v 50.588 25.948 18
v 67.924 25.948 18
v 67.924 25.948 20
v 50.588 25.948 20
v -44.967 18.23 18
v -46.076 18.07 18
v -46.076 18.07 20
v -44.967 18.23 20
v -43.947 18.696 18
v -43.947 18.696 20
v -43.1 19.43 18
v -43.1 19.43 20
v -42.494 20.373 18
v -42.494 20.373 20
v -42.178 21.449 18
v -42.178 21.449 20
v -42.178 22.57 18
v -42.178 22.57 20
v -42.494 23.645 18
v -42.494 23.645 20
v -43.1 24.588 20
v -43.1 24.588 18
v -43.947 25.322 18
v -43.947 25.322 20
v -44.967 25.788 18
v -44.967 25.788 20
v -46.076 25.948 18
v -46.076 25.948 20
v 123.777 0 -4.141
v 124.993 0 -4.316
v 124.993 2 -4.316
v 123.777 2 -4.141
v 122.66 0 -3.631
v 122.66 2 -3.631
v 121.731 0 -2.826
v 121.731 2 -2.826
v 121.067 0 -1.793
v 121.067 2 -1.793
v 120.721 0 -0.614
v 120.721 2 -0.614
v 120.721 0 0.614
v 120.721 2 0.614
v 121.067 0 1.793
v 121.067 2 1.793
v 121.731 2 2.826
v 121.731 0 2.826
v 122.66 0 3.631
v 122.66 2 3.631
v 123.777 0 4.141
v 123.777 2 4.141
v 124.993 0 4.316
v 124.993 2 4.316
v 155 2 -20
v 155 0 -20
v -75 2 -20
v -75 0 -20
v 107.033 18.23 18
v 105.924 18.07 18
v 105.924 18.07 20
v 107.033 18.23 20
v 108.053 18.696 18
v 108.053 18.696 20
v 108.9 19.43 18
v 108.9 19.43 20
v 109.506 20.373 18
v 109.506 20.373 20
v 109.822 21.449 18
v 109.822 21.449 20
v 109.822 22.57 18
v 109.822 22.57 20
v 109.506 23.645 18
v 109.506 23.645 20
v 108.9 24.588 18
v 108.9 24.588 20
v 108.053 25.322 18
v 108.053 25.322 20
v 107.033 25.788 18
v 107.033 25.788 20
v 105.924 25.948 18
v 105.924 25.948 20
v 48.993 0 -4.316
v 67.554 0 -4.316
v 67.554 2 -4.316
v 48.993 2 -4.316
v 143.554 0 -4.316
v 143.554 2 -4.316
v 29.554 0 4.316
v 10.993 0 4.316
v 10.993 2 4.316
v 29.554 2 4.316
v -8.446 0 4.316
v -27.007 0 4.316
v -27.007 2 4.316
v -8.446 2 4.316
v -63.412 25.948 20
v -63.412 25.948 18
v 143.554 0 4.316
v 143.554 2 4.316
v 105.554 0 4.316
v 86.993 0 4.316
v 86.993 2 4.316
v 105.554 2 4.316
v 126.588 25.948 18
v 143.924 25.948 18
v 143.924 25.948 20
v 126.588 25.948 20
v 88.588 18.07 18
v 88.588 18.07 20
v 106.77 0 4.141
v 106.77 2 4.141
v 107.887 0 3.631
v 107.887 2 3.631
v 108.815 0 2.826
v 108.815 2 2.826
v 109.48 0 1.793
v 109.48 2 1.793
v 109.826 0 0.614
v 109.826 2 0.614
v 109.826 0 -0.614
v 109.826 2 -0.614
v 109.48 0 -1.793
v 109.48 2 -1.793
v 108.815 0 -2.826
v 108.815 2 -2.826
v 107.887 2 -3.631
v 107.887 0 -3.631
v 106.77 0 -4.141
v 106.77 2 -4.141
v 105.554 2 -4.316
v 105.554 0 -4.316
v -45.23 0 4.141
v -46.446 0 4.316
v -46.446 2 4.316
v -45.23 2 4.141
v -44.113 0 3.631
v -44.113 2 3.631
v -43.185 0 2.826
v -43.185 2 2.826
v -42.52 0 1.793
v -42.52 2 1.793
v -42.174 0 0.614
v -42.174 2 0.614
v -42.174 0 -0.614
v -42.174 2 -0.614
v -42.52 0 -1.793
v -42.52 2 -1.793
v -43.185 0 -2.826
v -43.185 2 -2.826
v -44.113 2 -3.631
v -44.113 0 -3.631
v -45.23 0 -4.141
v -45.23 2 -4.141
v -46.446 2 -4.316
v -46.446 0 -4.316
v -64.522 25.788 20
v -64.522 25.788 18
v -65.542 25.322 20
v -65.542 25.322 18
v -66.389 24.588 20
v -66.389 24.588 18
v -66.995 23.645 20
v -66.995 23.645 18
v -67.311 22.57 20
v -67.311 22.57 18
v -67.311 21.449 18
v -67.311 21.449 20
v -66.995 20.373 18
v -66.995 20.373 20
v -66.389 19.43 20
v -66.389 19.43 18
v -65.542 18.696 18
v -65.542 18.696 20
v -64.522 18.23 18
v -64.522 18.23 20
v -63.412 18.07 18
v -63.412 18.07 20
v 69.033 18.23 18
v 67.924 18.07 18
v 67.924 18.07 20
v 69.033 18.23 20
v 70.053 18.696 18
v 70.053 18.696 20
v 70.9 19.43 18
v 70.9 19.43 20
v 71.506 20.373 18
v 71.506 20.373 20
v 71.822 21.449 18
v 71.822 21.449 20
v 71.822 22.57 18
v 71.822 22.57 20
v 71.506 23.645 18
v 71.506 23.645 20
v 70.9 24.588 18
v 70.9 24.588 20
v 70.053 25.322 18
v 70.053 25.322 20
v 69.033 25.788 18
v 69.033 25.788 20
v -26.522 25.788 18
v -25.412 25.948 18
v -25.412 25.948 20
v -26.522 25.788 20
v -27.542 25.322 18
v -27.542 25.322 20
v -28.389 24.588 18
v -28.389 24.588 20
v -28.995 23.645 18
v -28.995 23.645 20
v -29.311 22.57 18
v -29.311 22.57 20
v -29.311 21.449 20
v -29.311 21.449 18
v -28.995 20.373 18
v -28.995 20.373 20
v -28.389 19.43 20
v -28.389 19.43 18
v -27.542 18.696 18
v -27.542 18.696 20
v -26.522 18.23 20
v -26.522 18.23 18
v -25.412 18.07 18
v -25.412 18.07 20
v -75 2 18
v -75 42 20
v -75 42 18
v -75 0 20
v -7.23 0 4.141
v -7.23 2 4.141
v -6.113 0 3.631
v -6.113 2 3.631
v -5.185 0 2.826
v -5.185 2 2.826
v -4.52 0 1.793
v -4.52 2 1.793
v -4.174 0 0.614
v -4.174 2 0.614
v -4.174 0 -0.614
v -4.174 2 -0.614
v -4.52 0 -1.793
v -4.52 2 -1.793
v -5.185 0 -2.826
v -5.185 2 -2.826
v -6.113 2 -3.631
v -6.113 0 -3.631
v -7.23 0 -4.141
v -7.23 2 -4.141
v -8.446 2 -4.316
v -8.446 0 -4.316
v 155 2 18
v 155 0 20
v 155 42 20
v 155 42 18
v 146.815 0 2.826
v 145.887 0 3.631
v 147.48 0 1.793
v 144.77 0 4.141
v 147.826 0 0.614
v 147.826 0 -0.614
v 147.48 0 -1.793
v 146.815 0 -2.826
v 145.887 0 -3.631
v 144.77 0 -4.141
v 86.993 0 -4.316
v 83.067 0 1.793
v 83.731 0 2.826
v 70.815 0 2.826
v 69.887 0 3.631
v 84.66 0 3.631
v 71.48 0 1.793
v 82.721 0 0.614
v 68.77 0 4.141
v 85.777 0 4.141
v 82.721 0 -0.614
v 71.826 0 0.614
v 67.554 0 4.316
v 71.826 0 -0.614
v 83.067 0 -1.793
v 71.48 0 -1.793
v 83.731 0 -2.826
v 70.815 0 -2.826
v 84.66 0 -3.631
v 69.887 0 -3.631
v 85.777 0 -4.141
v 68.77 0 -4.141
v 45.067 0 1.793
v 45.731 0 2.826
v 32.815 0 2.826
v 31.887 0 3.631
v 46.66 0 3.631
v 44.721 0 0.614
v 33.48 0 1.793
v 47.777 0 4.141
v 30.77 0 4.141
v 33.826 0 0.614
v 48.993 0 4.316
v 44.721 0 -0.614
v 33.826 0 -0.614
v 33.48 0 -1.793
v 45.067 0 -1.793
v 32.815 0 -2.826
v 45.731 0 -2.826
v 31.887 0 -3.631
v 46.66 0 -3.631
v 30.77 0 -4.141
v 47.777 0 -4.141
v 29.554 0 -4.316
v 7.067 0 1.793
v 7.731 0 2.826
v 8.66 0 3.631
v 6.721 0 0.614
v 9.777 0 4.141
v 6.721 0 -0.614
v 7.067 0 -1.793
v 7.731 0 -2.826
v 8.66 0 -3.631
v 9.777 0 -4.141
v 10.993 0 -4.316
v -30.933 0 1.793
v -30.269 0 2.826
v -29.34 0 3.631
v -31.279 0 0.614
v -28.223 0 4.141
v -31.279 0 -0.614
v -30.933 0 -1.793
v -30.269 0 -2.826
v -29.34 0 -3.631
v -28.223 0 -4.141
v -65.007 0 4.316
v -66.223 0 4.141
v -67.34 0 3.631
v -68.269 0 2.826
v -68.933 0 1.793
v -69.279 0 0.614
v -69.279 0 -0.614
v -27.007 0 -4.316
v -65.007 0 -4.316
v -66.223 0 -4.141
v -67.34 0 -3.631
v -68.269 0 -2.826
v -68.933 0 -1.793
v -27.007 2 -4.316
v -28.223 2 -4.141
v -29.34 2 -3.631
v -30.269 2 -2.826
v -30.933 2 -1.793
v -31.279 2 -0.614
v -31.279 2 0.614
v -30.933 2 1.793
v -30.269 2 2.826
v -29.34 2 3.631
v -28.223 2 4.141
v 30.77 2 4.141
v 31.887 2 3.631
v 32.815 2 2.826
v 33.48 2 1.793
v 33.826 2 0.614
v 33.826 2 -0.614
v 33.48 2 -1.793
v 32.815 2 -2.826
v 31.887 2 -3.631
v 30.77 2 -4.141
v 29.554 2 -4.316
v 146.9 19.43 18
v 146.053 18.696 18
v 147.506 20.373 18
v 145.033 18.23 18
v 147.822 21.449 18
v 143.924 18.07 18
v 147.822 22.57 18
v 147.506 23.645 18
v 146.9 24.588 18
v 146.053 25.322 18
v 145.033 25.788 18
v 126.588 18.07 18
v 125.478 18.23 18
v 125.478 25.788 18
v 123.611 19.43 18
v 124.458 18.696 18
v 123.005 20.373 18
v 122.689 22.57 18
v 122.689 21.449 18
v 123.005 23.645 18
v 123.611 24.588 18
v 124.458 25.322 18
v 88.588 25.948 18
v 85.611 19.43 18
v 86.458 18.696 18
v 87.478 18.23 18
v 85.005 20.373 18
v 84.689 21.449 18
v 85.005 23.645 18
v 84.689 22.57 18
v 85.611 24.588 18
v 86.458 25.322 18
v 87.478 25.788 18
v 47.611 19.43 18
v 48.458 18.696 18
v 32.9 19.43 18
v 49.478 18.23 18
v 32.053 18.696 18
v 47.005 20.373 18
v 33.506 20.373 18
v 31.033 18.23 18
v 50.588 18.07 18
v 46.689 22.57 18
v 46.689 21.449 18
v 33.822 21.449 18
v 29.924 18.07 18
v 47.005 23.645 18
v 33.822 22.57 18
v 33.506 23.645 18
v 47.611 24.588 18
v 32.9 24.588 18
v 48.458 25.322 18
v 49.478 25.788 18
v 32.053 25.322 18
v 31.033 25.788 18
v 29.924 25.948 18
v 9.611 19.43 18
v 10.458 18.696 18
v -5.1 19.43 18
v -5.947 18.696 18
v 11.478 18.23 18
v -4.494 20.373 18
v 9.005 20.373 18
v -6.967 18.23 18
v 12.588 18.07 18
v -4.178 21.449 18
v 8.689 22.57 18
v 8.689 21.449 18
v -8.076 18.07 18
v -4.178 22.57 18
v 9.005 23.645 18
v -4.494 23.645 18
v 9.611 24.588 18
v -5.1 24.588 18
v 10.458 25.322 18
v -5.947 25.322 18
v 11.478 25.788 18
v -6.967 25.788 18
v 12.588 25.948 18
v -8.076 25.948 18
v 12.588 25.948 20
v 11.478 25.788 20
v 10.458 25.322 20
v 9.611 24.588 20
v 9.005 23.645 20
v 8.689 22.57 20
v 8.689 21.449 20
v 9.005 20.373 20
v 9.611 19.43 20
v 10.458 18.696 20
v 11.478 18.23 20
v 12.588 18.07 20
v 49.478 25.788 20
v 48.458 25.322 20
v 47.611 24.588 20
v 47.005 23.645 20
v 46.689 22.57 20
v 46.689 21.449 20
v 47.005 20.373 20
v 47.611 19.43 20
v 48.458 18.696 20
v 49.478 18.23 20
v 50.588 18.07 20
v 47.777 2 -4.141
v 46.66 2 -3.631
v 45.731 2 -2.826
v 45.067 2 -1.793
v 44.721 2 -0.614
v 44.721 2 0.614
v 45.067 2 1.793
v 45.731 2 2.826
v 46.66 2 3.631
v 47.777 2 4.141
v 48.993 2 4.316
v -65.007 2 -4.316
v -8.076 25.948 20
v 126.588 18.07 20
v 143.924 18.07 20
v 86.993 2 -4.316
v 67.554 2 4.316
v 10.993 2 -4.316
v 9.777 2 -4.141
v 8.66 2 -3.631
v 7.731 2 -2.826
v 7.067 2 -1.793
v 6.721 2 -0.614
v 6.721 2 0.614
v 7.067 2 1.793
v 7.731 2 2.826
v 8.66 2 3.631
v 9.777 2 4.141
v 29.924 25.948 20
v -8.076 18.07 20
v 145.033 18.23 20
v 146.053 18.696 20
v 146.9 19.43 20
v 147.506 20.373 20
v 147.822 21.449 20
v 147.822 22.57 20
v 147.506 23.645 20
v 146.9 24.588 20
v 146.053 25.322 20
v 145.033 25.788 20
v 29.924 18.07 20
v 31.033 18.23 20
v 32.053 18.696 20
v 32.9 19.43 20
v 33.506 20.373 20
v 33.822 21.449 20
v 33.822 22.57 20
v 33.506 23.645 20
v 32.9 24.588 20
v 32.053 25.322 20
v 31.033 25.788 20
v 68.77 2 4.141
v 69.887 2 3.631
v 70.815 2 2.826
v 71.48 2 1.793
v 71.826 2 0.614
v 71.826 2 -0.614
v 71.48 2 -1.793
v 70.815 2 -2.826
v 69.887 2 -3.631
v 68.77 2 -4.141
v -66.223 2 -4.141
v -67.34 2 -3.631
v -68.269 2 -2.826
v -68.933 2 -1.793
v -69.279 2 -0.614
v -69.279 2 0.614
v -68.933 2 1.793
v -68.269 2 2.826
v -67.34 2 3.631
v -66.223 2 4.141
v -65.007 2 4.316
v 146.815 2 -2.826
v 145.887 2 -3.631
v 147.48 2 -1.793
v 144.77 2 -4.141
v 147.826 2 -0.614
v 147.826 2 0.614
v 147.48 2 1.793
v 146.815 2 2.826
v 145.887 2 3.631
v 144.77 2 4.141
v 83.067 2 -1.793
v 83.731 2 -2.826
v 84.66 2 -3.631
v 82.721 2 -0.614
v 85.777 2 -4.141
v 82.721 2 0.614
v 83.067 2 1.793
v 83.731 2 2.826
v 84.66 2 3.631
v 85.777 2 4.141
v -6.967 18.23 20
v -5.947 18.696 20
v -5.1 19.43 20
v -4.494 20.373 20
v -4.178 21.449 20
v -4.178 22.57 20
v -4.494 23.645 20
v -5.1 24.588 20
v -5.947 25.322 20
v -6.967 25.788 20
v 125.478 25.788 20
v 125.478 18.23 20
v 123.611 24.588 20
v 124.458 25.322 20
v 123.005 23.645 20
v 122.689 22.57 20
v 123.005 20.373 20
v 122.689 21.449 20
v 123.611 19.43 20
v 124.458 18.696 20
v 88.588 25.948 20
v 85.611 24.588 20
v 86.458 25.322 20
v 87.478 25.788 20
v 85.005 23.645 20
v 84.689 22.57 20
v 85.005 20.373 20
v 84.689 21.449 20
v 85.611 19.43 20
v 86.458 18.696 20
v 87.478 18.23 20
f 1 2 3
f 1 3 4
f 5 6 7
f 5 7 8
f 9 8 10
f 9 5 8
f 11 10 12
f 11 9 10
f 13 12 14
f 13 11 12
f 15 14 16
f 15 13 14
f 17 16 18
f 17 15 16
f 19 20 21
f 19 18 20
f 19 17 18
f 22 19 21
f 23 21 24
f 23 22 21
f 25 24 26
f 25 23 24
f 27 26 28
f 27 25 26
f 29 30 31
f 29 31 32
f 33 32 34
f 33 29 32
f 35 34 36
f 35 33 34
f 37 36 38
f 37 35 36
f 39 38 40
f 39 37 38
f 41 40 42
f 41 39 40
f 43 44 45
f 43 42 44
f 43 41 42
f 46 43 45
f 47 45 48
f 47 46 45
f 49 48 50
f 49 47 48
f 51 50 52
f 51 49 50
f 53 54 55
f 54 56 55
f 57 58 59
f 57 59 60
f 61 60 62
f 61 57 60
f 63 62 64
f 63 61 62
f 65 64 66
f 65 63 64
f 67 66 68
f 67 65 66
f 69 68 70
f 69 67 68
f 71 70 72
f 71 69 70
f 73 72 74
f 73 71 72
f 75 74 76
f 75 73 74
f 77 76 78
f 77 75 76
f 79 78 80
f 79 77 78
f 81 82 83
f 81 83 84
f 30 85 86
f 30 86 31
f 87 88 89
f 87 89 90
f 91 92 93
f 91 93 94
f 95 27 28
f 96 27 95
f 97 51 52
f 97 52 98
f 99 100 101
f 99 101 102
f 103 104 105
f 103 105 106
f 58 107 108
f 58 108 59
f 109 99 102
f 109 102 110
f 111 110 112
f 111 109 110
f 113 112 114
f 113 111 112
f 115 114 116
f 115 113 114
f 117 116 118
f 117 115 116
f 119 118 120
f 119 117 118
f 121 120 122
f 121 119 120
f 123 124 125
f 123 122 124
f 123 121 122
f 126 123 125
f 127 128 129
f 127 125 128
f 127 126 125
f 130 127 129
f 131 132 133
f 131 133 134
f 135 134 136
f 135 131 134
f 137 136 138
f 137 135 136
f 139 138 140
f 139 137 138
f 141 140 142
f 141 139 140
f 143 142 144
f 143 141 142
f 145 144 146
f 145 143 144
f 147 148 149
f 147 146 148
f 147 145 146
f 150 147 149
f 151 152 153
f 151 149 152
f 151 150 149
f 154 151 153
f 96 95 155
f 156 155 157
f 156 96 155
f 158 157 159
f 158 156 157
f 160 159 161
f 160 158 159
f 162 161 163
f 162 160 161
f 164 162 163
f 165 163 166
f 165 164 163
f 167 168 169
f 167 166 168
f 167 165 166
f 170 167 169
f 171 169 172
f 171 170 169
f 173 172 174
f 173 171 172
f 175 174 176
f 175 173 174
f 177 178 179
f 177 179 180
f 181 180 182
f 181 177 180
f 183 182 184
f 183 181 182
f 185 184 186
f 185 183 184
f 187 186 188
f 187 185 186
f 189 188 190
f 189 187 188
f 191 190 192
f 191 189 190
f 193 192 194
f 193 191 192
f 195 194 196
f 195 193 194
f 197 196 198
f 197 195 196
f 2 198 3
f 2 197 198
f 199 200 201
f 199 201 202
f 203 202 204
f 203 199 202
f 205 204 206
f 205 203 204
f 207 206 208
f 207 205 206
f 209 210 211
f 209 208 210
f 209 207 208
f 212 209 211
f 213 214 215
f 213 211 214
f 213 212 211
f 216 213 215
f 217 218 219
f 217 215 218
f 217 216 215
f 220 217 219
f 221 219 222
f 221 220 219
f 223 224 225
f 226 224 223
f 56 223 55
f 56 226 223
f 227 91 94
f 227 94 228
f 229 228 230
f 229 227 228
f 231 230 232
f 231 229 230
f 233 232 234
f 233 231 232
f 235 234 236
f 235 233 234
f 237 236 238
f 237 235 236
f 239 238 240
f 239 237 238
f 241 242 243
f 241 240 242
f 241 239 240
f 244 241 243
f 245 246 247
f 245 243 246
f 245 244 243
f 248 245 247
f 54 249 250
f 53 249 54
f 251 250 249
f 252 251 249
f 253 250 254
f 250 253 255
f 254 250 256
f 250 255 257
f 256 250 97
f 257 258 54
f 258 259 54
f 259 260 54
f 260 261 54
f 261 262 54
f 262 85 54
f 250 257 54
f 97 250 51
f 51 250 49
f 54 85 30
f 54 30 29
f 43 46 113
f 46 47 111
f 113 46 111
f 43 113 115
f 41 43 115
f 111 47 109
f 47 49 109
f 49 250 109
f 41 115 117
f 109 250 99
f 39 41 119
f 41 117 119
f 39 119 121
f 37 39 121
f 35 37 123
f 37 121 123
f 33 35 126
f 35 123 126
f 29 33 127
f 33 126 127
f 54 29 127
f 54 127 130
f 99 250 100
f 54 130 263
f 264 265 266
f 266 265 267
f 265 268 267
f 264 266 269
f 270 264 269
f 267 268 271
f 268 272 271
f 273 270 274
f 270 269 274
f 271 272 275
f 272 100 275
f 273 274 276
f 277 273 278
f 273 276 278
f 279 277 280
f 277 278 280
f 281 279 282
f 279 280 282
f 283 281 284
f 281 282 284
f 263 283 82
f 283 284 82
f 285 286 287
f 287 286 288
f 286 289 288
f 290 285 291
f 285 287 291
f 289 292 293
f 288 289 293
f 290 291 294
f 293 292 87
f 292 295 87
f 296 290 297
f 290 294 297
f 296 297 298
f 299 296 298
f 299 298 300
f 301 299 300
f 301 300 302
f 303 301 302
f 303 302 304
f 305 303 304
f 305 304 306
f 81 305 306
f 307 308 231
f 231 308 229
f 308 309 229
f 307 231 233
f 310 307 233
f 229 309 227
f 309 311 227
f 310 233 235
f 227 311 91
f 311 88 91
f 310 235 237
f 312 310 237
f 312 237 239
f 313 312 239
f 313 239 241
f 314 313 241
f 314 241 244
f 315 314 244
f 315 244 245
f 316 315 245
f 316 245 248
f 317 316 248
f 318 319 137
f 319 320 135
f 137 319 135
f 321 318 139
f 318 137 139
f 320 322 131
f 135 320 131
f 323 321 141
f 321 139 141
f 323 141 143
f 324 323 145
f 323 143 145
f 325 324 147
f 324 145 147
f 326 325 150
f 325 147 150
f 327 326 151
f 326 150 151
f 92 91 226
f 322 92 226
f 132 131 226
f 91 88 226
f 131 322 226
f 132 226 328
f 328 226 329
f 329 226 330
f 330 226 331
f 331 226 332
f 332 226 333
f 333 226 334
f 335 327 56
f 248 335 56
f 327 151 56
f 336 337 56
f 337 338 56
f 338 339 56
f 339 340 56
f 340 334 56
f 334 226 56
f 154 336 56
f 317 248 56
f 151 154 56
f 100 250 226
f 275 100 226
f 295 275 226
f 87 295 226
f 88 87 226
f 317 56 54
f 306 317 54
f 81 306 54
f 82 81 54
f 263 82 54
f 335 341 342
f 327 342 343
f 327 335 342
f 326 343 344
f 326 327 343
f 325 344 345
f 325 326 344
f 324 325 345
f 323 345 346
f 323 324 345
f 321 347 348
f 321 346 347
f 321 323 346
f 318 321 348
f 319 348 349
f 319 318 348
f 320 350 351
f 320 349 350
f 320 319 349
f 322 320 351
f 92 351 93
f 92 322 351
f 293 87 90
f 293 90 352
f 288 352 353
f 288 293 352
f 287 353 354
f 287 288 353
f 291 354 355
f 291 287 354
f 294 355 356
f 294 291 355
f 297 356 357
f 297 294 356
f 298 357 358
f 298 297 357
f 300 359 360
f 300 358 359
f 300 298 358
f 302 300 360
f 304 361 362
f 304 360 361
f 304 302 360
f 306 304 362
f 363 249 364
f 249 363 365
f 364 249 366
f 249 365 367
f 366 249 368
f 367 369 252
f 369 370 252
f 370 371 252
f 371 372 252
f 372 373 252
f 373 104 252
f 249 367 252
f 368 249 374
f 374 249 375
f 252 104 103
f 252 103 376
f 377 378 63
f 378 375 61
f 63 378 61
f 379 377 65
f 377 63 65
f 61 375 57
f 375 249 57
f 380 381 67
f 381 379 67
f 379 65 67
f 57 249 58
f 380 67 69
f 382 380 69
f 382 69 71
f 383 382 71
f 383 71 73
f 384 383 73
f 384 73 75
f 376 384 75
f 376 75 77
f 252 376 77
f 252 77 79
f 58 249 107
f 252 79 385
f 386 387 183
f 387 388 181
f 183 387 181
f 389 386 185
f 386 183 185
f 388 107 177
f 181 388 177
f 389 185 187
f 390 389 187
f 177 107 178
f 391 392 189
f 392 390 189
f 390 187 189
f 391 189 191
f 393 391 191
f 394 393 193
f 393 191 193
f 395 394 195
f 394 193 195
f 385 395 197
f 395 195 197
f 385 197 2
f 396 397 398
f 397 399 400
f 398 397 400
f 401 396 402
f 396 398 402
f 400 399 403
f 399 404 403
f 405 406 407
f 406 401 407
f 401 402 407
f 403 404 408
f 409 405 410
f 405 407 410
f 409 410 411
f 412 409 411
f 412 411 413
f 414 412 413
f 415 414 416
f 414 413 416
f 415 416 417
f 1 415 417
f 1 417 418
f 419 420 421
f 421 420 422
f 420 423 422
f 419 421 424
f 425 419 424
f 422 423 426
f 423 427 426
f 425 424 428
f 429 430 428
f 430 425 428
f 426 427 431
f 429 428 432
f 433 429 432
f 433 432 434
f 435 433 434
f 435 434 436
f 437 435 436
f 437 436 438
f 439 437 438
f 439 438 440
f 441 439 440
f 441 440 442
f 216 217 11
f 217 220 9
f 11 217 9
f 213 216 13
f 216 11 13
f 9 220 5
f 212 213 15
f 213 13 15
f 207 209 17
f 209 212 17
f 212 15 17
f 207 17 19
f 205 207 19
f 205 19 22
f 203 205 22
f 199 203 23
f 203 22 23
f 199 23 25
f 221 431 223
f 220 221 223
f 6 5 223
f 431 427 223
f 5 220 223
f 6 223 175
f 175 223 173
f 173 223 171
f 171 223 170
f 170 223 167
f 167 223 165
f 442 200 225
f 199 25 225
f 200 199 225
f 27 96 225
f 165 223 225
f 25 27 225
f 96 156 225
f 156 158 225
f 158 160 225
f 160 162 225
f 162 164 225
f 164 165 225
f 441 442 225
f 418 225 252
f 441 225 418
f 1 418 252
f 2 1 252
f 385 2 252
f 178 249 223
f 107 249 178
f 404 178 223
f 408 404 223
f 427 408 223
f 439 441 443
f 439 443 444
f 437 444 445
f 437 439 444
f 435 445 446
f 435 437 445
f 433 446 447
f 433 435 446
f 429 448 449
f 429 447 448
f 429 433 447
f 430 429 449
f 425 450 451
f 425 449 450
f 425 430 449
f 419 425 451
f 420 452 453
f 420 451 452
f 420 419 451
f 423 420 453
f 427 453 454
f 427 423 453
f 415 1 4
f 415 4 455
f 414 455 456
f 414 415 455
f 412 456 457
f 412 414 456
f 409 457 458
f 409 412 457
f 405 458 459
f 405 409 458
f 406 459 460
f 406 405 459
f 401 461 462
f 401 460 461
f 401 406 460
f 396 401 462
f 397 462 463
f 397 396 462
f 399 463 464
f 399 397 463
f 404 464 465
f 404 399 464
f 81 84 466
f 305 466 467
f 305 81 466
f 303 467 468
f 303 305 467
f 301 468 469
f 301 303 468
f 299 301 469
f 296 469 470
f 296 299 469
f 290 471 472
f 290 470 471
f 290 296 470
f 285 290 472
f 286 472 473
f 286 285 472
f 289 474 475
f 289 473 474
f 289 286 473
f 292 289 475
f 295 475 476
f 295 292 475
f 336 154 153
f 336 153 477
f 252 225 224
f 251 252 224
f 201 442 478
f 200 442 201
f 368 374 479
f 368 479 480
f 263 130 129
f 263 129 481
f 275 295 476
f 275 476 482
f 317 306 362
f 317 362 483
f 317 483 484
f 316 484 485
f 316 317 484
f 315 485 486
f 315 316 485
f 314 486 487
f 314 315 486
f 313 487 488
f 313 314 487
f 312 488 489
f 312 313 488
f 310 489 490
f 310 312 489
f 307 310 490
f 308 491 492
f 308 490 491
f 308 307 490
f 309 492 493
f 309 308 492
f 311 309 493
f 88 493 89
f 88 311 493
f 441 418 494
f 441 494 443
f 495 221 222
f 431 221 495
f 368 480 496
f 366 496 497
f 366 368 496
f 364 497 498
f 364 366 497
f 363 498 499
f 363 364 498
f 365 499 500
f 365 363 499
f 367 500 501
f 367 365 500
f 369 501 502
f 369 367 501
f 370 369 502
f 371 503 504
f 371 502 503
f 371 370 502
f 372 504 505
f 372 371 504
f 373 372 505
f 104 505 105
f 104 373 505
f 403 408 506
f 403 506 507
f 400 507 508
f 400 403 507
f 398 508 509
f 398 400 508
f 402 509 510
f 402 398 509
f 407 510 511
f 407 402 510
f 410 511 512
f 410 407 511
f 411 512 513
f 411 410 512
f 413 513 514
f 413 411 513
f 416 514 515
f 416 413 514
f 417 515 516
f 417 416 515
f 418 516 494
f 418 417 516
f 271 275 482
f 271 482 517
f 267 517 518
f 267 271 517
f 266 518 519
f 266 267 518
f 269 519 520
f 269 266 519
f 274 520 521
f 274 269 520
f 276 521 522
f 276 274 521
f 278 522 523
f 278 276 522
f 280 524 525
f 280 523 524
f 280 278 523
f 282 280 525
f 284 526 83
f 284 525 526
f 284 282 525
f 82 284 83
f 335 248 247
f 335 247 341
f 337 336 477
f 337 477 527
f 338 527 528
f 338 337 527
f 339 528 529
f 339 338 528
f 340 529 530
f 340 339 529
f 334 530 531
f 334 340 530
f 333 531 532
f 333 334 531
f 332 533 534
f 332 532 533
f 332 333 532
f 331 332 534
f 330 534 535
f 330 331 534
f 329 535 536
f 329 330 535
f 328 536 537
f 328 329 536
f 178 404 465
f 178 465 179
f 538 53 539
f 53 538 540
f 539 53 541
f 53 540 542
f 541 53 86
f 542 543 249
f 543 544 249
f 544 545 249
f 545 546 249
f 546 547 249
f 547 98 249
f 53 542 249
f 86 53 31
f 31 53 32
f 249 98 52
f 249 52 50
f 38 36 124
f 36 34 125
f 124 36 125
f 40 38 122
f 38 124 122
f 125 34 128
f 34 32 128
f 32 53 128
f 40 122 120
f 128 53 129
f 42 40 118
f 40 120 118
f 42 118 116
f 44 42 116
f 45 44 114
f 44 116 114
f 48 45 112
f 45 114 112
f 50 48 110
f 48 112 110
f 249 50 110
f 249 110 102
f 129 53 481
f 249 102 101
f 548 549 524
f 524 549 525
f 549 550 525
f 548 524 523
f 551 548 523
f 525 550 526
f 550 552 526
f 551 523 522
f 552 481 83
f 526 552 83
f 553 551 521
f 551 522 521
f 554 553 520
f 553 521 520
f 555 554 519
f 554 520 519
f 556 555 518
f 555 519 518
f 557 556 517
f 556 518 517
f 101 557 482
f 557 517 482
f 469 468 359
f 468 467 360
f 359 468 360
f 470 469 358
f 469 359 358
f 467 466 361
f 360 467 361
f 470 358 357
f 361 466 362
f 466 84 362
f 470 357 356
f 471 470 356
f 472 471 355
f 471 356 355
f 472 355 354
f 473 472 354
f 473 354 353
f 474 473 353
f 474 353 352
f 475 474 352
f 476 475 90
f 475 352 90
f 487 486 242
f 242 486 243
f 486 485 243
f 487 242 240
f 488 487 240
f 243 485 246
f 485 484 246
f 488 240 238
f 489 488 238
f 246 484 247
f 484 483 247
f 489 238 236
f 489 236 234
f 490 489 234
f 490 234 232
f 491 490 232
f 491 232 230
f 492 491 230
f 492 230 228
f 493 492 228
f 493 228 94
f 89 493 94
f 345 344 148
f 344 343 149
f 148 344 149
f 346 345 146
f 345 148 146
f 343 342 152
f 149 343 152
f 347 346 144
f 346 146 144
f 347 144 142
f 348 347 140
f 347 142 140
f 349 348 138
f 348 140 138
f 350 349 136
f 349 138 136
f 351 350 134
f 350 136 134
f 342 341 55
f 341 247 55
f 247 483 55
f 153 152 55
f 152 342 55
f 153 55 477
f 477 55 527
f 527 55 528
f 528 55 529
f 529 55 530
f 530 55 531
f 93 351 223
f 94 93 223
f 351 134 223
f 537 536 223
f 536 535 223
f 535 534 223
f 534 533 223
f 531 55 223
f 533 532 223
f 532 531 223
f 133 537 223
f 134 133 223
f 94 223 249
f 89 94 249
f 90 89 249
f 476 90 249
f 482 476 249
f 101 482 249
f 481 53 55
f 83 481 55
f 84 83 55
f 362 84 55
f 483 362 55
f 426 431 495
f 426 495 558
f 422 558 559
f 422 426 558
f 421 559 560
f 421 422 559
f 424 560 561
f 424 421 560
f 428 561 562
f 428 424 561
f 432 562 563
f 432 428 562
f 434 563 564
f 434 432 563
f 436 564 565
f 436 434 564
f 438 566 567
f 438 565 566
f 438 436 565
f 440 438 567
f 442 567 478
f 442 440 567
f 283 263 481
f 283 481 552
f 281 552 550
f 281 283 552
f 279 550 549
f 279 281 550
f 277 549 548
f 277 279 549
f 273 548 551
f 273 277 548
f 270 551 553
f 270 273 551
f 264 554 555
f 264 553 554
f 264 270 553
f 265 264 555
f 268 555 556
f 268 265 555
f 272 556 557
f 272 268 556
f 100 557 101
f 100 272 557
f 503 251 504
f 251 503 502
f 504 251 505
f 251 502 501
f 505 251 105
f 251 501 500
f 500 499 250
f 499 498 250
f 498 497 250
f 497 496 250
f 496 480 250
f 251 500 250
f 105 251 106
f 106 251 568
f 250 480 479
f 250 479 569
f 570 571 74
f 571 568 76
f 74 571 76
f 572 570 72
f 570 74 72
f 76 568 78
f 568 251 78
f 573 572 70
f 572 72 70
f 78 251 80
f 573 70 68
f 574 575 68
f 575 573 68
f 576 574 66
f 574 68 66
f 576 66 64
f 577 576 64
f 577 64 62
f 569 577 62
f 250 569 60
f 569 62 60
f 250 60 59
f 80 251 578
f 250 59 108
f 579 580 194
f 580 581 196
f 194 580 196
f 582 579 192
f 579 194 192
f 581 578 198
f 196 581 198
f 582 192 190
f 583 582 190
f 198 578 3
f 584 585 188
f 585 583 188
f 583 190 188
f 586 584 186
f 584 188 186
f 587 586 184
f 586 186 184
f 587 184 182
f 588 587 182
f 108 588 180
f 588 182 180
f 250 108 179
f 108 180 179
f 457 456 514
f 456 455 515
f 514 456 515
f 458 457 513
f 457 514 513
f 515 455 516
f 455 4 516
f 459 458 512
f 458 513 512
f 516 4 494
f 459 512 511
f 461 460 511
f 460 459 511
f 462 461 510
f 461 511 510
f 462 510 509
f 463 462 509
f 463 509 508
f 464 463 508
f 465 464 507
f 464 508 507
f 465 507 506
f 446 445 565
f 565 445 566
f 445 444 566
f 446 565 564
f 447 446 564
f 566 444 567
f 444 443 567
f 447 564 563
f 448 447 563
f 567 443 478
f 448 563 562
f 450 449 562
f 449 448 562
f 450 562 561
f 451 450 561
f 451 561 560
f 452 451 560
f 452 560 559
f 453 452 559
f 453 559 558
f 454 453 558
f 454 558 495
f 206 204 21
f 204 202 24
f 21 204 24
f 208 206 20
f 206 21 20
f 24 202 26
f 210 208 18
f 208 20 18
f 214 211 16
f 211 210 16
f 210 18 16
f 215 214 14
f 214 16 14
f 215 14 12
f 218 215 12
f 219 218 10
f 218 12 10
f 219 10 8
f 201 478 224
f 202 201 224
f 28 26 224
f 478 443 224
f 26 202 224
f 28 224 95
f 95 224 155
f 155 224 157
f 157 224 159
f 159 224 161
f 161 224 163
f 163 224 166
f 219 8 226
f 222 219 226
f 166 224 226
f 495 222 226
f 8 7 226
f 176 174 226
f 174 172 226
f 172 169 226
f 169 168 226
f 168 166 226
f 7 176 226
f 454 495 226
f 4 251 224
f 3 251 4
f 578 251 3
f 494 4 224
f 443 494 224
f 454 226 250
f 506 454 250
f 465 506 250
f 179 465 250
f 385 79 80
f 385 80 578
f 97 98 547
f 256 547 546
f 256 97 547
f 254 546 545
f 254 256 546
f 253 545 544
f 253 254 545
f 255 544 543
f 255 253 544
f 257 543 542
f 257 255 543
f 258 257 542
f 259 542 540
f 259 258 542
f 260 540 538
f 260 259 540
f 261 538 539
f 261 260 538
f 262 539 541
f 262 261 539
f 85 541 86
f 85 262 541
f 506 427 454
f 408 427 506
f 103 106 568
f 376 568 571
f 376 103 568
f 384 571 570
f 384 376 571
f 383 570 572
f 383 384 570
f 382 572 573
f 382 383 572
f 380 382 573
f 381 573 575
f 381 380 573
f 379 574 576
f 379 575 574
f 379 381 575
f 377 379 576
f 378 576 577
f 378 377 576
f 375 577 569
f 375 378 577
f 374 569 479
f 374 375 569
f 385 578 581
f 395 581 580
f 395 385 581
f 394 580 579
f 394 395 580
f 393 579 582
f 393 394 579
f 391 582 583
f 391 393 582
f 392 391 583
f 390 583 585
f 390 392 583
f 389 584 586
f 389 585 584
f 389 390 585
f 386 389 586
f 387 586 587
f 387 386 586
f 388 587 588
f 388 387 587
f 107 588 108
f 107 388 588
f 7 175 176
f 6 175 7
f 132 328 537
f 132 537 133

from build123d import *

# Parameters (mm, degrees)
SKETCH1_W           = 150
SKETCH1_H           = 40
BOSS_EXTRUDE1_DEPTH = 2
SKETCH2_W           = 150
SKETCH2_H           = 2
BOSS_EXTRUDE2_DEPTH = 40
BOSS_EXTRUDE3_DEPTH = 80
CUT_EXTRUDE1_DEPTH  = 10
CUT_EXTRUDE2_DEPTH  = 10


with BuildPart() as part:
    # Sketch1 → Boss-Extrude1 (new body)
    with BuildSketch(Plane(origin=(0, 0, 0), x_dir=(1, 0, 0), z_dir=(0, 1, 0))):
        Rectangle(SKETCH1_W, SKETCH1_H)
    extrude(amount=BOSS_EXTRUDE1_DEPTH)

    # Sketch2 → Boss-Extrude2 (add)
    with BuildSketch(Plane(origin=(0, 2, 0), x_dir=(1, 0, 0), z_dir=(0, 1, 0))):
        with Locations((0, -19)):
            Rectangle(SKETCH2_W, SKETCH2_H)
    extrude(amount=BOSS_EXTRUDE2_DEPTH)

    # Sketch5 → Boss-Extrude3 (add)
    with BuildSketch(Plane(origin=(75, 0, 0), x_dir=(0, 0, -1), z_dir=(1, 0, 0))):
        Polygon((-20, 0), (20, 0), (20, 2), (-18, 2), (-18, 42), (-20, 42), align=None)
    extrude(amount=BOSS_EXTRUDE3_DEPTH)

    # Sketch6 → Cut-Extrude1 (cut)
    with BuildSketch(Plane(origin=(0, 0, 18), x_dir=(-1, 0, 0), z_dir=(0, 0, -1))):
        with BuildLine():
            Line((-105.923719426, 25.947585899), (-88.587761645, 25.947585899))
            ThreePointArc((-88.587761645, 25.947585899), (-84.649216654, 22.009040908), (-88.587761645, 18.070495916))
            Line((-88.587761645, 18.070495916), (-105.923719426, 18.070495916))
            ThreePointArc((-105.923719426, 18.070495916), (-109.862264418, 22.009040908), (-105.923719426, 25.947585899))
        make_face()
        with BuildLine():
            Line((-143.923719426, 25.947585899), (-126.587761645, 25.947585899))
            ThreePointArc((-126.587761645, 25.947585899), (-122.649216654, 22.009040908), (-126.587761645, 18.070495916))
            Line((-126.587761645, 18.070495916), (-143.923719426, 18.070495916))
            ThreePointArc((-143.923719426, 18.070495916), (-147.862264418, 22.009040908), (-143.923719426, 25.947585899))
        make_face()
        with BuildLine():
            Line((-67.923719426, 25.947585899), (-50.587761645, 25.947585899))
            ThreePointArc((-50.587761645, 25.947585899), (-46.649216654, 22.009040908), (-50.587761645, 18.070495916))
            Line((-50.587761645, 18.070495916), (-67.923719426, 18.070495916))
            ThreePointArc((-67.923719426, 18.070495916), (-71.862264418, 22.009040908), (-67.923719426, 25.947585899))
        make_face()
        with BuildLine():
            Line((-29.923719426, 25.947585899), (-12.587761645, 25.947585899))
            ThreePointArc((-12.587761645, 25.947585899), (-8.649216654, 22.009040908), (-12.587761645, 18.070495916))
            Line((-12.587761645, 18.070495916), (-29.923719426, 18.070495916))
            ThreePointArc((-29.923719426, 18.070495916), (-33.862264418, 22.009040908), (-29.923719426, 25.947585899))
        make_face()
        with BuildLine():
            Line((8.076280574, 25.947585899), (25.412238355, 25.947585899))
            ThreePointArc((25.412238355, 25.947585899), (29.350783346, 22.009040908), (25.412238355, 18.070495916))
            Line((25.412238355, 18.070495916), (8.076280574, 18.070495916))
            ThreePointArc((8.076280574, 18.070495916), (4.137735582, 22.009040908), (8.076280574, 25.947585899))
        make_face()
        with BuildLine():
            Line((46.076280574, 25.947585899), (63.412238355, 25.947585899))
            ThreePointArc((63.412238355, 25.947585899), (67.350783346, 22.009040908), (63.412238355, 18.070495916))
            Line((63.412238355, 18.070495916), (46.076280574, 18.070495916))
            ThreePointArc((46.076280574, 18.070495916), (42.137735582, 22.009040908), (46.076280574, 25.947585899))
        make_face()
    extrude(amount=-CUT_EXTRUDE1_DEPTH, mode=Mode.SUBTRACT)

    # Sketch7 → Cut-Extrude2 (cut)
    with BuildSketch(Plane.XZ):
        with BuildLine():
            Line((-27.006843458, 4.316067859), (-8.446451171, 4.316067859))
            ThreePointArc((-8.446451171, 4.316067859), (-4.130383312, 0), (-8.446451171, -4.316067859))
            Line((-8.446451171, -4.316067859), (-27.006843458, -4.316067859))
            ThreePointArc((-27.006843458, -4.316067859), (-31.322911318, 0), (-27.006843458, 4.316067859))
        make_face()
        with BuildLine():
            Line((-65.006843458, 4.316067859), (-46.446451171, 4.316067859))
            ThreePointArc((-46.446451171, 4.316067859), (-42.130383312, 0), (-46.446451171, -4.316067859))
            Line((-46.446451171, -4.316067859), (-65.006843458, -4.316067859))
            ThreePointArc((-65.006843458, -4.316067859), (-69.322911318, 0), (-65.006843458, 4.316067859))
        make_face()
        with BuildLine():
            Line((10.993156542, 4.316067859), (29.553548829, 4.316067859))
            ThreePointArc((29.553548829, 4.316067859), (33.869616688, 0), (29.553548829, -4.316067859))
            Line((29.553548829, -4.316067859), (10.993156542, -4.316067859))
            ThreePointArc((10.993156542, -4.316067859), (6.677088682, 0), (10.993156542, 4.316067859))
        make_face()
        with BuildLine():
            Line((48.993156542, 4.316067859), (67.553548829, 4.316067859))
            ThreePointArc((67.553548829, 4.316067859), (71.869616688, 0), (67.553548829, -4.316067859))
            Line((67.553548829, -4.316067859), (48.993156542, -4.316067859))
            ThreePointArc((48.993156542, -4.316067859), (44.677088682, 0), (48.993156542, 4.316067859))
        make_face()
        with BuildLine():
            Line((86.993156542, 4.316067859), (105.553548829, 4.316067859))
            ThreePointArc((105.553548829, 4.316067859), (109.869616688, 0), (105.553548829, -4.316067859))
            Line((105.553548829, -4.316067859), (86.993156542, -4.316067859))
            ThreePointArc((86.993156542, -4.316067859), (82.677088682, 0), (86.993156542, 4.316067859))
        make_face()
        with BuildLine():
            Line((124.993156542, 4.316067859), (143.553548829, 4.316067859))
            ThreePointArc((143.553548829, 4.316067859), (147.869616688, 0), (143.553548829, -4.316067859))
            Line((143.553548829, -4.316067859), (124.993156542, -4.316067859))
            ThreePointArc((124.993156542, -4.316067859), (120.677088682, 0), (124.993156542, 4.316067859))
        make_face()
    extrude(amount=-CUT_EXTRUDE2_DEPTH, mode=Mode.SUBTRACT)


solid = part.part
